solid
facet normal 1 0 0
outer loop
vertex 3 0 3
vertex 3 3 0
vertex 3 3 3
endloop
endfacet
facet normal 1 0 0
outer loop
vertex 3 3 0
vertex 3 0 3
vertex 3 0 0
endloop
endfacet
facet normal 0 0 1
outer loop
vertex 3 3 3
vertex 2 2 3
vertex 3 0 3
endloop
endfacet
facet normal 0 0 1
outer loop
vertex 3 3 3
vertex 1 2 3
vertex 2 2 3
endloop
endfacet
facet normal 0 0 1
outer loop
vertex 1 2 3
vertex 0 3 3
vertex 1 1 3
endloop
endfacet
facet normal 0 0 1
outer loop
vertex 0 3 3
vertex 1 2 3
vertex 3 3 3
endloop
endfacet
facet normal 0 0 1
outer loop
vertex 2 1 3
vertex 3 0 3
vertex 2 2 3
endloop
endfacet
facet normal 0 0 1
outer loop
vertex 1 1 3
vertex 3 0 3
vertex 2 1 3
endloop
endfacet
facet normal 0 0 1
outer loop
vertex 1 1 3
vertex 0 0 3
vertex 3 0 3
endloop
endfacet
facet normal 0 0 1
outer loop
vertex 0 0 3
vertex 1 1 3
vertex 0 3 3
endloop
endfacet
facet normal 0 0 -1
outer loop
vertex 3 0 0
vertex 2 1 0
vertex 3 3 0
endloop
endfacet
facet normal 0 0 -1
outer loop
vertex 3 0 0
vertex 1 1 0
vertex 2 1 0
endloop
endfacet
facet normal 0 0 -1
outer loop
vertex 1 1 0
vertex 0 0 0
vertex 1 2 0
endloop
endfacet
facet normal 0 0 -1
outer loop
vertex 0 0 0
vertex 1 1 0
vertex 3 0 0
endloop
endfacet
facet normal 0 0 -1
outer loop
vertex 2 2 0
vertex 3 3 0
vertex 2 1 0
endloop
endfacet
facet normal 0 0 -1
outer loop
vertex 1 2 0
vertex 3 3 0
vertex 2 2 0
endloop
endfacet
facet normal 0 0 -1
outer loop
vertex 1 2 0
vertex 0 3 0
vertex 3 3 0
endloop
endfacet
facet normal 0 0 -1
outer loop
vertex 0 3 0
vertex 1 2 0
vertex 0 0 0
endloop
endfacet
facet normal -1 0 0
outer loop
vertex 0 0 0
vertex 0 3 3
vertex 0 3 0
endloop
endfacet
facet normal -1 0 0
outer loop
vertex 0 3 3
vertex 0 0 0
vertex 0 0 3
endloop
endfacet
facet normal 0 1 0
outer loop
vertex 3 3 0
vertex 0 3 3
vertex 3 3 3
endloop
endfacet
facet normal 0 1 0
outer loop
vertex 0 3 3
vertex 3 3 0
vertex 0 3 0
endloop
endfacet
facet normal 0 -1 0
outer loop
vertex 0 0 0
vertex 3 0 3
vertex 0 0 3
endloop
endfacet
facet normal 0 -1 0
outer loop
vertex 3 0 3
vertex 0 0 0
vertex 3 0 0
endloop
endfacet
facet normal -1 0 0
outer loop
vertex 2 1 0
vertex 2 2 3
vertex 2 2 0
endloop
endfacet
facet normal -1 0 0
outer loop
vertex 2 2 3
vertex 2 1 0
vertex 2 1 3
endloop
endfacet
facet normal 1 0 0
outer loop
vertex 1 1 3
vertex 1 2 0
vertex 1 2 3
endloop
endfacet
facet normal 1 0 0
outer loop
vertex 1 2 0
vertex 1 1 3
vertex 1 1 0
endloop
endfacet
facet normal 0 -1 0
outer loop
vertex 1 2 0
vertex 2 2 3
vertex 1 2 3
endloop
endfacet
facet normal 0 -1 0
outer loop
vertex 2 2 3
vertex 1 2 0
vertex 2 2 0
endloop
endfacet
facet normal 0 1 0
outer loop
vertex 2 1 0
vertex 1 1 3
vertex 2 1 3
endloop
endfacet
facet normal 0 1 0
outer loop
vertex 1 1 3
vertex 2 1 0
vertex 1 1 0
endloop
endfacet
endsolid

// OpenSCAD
difference() {
  cube([3, 3, 3]);
  translate([1, 1, -1]) cube([1, 1, 5]);
}
